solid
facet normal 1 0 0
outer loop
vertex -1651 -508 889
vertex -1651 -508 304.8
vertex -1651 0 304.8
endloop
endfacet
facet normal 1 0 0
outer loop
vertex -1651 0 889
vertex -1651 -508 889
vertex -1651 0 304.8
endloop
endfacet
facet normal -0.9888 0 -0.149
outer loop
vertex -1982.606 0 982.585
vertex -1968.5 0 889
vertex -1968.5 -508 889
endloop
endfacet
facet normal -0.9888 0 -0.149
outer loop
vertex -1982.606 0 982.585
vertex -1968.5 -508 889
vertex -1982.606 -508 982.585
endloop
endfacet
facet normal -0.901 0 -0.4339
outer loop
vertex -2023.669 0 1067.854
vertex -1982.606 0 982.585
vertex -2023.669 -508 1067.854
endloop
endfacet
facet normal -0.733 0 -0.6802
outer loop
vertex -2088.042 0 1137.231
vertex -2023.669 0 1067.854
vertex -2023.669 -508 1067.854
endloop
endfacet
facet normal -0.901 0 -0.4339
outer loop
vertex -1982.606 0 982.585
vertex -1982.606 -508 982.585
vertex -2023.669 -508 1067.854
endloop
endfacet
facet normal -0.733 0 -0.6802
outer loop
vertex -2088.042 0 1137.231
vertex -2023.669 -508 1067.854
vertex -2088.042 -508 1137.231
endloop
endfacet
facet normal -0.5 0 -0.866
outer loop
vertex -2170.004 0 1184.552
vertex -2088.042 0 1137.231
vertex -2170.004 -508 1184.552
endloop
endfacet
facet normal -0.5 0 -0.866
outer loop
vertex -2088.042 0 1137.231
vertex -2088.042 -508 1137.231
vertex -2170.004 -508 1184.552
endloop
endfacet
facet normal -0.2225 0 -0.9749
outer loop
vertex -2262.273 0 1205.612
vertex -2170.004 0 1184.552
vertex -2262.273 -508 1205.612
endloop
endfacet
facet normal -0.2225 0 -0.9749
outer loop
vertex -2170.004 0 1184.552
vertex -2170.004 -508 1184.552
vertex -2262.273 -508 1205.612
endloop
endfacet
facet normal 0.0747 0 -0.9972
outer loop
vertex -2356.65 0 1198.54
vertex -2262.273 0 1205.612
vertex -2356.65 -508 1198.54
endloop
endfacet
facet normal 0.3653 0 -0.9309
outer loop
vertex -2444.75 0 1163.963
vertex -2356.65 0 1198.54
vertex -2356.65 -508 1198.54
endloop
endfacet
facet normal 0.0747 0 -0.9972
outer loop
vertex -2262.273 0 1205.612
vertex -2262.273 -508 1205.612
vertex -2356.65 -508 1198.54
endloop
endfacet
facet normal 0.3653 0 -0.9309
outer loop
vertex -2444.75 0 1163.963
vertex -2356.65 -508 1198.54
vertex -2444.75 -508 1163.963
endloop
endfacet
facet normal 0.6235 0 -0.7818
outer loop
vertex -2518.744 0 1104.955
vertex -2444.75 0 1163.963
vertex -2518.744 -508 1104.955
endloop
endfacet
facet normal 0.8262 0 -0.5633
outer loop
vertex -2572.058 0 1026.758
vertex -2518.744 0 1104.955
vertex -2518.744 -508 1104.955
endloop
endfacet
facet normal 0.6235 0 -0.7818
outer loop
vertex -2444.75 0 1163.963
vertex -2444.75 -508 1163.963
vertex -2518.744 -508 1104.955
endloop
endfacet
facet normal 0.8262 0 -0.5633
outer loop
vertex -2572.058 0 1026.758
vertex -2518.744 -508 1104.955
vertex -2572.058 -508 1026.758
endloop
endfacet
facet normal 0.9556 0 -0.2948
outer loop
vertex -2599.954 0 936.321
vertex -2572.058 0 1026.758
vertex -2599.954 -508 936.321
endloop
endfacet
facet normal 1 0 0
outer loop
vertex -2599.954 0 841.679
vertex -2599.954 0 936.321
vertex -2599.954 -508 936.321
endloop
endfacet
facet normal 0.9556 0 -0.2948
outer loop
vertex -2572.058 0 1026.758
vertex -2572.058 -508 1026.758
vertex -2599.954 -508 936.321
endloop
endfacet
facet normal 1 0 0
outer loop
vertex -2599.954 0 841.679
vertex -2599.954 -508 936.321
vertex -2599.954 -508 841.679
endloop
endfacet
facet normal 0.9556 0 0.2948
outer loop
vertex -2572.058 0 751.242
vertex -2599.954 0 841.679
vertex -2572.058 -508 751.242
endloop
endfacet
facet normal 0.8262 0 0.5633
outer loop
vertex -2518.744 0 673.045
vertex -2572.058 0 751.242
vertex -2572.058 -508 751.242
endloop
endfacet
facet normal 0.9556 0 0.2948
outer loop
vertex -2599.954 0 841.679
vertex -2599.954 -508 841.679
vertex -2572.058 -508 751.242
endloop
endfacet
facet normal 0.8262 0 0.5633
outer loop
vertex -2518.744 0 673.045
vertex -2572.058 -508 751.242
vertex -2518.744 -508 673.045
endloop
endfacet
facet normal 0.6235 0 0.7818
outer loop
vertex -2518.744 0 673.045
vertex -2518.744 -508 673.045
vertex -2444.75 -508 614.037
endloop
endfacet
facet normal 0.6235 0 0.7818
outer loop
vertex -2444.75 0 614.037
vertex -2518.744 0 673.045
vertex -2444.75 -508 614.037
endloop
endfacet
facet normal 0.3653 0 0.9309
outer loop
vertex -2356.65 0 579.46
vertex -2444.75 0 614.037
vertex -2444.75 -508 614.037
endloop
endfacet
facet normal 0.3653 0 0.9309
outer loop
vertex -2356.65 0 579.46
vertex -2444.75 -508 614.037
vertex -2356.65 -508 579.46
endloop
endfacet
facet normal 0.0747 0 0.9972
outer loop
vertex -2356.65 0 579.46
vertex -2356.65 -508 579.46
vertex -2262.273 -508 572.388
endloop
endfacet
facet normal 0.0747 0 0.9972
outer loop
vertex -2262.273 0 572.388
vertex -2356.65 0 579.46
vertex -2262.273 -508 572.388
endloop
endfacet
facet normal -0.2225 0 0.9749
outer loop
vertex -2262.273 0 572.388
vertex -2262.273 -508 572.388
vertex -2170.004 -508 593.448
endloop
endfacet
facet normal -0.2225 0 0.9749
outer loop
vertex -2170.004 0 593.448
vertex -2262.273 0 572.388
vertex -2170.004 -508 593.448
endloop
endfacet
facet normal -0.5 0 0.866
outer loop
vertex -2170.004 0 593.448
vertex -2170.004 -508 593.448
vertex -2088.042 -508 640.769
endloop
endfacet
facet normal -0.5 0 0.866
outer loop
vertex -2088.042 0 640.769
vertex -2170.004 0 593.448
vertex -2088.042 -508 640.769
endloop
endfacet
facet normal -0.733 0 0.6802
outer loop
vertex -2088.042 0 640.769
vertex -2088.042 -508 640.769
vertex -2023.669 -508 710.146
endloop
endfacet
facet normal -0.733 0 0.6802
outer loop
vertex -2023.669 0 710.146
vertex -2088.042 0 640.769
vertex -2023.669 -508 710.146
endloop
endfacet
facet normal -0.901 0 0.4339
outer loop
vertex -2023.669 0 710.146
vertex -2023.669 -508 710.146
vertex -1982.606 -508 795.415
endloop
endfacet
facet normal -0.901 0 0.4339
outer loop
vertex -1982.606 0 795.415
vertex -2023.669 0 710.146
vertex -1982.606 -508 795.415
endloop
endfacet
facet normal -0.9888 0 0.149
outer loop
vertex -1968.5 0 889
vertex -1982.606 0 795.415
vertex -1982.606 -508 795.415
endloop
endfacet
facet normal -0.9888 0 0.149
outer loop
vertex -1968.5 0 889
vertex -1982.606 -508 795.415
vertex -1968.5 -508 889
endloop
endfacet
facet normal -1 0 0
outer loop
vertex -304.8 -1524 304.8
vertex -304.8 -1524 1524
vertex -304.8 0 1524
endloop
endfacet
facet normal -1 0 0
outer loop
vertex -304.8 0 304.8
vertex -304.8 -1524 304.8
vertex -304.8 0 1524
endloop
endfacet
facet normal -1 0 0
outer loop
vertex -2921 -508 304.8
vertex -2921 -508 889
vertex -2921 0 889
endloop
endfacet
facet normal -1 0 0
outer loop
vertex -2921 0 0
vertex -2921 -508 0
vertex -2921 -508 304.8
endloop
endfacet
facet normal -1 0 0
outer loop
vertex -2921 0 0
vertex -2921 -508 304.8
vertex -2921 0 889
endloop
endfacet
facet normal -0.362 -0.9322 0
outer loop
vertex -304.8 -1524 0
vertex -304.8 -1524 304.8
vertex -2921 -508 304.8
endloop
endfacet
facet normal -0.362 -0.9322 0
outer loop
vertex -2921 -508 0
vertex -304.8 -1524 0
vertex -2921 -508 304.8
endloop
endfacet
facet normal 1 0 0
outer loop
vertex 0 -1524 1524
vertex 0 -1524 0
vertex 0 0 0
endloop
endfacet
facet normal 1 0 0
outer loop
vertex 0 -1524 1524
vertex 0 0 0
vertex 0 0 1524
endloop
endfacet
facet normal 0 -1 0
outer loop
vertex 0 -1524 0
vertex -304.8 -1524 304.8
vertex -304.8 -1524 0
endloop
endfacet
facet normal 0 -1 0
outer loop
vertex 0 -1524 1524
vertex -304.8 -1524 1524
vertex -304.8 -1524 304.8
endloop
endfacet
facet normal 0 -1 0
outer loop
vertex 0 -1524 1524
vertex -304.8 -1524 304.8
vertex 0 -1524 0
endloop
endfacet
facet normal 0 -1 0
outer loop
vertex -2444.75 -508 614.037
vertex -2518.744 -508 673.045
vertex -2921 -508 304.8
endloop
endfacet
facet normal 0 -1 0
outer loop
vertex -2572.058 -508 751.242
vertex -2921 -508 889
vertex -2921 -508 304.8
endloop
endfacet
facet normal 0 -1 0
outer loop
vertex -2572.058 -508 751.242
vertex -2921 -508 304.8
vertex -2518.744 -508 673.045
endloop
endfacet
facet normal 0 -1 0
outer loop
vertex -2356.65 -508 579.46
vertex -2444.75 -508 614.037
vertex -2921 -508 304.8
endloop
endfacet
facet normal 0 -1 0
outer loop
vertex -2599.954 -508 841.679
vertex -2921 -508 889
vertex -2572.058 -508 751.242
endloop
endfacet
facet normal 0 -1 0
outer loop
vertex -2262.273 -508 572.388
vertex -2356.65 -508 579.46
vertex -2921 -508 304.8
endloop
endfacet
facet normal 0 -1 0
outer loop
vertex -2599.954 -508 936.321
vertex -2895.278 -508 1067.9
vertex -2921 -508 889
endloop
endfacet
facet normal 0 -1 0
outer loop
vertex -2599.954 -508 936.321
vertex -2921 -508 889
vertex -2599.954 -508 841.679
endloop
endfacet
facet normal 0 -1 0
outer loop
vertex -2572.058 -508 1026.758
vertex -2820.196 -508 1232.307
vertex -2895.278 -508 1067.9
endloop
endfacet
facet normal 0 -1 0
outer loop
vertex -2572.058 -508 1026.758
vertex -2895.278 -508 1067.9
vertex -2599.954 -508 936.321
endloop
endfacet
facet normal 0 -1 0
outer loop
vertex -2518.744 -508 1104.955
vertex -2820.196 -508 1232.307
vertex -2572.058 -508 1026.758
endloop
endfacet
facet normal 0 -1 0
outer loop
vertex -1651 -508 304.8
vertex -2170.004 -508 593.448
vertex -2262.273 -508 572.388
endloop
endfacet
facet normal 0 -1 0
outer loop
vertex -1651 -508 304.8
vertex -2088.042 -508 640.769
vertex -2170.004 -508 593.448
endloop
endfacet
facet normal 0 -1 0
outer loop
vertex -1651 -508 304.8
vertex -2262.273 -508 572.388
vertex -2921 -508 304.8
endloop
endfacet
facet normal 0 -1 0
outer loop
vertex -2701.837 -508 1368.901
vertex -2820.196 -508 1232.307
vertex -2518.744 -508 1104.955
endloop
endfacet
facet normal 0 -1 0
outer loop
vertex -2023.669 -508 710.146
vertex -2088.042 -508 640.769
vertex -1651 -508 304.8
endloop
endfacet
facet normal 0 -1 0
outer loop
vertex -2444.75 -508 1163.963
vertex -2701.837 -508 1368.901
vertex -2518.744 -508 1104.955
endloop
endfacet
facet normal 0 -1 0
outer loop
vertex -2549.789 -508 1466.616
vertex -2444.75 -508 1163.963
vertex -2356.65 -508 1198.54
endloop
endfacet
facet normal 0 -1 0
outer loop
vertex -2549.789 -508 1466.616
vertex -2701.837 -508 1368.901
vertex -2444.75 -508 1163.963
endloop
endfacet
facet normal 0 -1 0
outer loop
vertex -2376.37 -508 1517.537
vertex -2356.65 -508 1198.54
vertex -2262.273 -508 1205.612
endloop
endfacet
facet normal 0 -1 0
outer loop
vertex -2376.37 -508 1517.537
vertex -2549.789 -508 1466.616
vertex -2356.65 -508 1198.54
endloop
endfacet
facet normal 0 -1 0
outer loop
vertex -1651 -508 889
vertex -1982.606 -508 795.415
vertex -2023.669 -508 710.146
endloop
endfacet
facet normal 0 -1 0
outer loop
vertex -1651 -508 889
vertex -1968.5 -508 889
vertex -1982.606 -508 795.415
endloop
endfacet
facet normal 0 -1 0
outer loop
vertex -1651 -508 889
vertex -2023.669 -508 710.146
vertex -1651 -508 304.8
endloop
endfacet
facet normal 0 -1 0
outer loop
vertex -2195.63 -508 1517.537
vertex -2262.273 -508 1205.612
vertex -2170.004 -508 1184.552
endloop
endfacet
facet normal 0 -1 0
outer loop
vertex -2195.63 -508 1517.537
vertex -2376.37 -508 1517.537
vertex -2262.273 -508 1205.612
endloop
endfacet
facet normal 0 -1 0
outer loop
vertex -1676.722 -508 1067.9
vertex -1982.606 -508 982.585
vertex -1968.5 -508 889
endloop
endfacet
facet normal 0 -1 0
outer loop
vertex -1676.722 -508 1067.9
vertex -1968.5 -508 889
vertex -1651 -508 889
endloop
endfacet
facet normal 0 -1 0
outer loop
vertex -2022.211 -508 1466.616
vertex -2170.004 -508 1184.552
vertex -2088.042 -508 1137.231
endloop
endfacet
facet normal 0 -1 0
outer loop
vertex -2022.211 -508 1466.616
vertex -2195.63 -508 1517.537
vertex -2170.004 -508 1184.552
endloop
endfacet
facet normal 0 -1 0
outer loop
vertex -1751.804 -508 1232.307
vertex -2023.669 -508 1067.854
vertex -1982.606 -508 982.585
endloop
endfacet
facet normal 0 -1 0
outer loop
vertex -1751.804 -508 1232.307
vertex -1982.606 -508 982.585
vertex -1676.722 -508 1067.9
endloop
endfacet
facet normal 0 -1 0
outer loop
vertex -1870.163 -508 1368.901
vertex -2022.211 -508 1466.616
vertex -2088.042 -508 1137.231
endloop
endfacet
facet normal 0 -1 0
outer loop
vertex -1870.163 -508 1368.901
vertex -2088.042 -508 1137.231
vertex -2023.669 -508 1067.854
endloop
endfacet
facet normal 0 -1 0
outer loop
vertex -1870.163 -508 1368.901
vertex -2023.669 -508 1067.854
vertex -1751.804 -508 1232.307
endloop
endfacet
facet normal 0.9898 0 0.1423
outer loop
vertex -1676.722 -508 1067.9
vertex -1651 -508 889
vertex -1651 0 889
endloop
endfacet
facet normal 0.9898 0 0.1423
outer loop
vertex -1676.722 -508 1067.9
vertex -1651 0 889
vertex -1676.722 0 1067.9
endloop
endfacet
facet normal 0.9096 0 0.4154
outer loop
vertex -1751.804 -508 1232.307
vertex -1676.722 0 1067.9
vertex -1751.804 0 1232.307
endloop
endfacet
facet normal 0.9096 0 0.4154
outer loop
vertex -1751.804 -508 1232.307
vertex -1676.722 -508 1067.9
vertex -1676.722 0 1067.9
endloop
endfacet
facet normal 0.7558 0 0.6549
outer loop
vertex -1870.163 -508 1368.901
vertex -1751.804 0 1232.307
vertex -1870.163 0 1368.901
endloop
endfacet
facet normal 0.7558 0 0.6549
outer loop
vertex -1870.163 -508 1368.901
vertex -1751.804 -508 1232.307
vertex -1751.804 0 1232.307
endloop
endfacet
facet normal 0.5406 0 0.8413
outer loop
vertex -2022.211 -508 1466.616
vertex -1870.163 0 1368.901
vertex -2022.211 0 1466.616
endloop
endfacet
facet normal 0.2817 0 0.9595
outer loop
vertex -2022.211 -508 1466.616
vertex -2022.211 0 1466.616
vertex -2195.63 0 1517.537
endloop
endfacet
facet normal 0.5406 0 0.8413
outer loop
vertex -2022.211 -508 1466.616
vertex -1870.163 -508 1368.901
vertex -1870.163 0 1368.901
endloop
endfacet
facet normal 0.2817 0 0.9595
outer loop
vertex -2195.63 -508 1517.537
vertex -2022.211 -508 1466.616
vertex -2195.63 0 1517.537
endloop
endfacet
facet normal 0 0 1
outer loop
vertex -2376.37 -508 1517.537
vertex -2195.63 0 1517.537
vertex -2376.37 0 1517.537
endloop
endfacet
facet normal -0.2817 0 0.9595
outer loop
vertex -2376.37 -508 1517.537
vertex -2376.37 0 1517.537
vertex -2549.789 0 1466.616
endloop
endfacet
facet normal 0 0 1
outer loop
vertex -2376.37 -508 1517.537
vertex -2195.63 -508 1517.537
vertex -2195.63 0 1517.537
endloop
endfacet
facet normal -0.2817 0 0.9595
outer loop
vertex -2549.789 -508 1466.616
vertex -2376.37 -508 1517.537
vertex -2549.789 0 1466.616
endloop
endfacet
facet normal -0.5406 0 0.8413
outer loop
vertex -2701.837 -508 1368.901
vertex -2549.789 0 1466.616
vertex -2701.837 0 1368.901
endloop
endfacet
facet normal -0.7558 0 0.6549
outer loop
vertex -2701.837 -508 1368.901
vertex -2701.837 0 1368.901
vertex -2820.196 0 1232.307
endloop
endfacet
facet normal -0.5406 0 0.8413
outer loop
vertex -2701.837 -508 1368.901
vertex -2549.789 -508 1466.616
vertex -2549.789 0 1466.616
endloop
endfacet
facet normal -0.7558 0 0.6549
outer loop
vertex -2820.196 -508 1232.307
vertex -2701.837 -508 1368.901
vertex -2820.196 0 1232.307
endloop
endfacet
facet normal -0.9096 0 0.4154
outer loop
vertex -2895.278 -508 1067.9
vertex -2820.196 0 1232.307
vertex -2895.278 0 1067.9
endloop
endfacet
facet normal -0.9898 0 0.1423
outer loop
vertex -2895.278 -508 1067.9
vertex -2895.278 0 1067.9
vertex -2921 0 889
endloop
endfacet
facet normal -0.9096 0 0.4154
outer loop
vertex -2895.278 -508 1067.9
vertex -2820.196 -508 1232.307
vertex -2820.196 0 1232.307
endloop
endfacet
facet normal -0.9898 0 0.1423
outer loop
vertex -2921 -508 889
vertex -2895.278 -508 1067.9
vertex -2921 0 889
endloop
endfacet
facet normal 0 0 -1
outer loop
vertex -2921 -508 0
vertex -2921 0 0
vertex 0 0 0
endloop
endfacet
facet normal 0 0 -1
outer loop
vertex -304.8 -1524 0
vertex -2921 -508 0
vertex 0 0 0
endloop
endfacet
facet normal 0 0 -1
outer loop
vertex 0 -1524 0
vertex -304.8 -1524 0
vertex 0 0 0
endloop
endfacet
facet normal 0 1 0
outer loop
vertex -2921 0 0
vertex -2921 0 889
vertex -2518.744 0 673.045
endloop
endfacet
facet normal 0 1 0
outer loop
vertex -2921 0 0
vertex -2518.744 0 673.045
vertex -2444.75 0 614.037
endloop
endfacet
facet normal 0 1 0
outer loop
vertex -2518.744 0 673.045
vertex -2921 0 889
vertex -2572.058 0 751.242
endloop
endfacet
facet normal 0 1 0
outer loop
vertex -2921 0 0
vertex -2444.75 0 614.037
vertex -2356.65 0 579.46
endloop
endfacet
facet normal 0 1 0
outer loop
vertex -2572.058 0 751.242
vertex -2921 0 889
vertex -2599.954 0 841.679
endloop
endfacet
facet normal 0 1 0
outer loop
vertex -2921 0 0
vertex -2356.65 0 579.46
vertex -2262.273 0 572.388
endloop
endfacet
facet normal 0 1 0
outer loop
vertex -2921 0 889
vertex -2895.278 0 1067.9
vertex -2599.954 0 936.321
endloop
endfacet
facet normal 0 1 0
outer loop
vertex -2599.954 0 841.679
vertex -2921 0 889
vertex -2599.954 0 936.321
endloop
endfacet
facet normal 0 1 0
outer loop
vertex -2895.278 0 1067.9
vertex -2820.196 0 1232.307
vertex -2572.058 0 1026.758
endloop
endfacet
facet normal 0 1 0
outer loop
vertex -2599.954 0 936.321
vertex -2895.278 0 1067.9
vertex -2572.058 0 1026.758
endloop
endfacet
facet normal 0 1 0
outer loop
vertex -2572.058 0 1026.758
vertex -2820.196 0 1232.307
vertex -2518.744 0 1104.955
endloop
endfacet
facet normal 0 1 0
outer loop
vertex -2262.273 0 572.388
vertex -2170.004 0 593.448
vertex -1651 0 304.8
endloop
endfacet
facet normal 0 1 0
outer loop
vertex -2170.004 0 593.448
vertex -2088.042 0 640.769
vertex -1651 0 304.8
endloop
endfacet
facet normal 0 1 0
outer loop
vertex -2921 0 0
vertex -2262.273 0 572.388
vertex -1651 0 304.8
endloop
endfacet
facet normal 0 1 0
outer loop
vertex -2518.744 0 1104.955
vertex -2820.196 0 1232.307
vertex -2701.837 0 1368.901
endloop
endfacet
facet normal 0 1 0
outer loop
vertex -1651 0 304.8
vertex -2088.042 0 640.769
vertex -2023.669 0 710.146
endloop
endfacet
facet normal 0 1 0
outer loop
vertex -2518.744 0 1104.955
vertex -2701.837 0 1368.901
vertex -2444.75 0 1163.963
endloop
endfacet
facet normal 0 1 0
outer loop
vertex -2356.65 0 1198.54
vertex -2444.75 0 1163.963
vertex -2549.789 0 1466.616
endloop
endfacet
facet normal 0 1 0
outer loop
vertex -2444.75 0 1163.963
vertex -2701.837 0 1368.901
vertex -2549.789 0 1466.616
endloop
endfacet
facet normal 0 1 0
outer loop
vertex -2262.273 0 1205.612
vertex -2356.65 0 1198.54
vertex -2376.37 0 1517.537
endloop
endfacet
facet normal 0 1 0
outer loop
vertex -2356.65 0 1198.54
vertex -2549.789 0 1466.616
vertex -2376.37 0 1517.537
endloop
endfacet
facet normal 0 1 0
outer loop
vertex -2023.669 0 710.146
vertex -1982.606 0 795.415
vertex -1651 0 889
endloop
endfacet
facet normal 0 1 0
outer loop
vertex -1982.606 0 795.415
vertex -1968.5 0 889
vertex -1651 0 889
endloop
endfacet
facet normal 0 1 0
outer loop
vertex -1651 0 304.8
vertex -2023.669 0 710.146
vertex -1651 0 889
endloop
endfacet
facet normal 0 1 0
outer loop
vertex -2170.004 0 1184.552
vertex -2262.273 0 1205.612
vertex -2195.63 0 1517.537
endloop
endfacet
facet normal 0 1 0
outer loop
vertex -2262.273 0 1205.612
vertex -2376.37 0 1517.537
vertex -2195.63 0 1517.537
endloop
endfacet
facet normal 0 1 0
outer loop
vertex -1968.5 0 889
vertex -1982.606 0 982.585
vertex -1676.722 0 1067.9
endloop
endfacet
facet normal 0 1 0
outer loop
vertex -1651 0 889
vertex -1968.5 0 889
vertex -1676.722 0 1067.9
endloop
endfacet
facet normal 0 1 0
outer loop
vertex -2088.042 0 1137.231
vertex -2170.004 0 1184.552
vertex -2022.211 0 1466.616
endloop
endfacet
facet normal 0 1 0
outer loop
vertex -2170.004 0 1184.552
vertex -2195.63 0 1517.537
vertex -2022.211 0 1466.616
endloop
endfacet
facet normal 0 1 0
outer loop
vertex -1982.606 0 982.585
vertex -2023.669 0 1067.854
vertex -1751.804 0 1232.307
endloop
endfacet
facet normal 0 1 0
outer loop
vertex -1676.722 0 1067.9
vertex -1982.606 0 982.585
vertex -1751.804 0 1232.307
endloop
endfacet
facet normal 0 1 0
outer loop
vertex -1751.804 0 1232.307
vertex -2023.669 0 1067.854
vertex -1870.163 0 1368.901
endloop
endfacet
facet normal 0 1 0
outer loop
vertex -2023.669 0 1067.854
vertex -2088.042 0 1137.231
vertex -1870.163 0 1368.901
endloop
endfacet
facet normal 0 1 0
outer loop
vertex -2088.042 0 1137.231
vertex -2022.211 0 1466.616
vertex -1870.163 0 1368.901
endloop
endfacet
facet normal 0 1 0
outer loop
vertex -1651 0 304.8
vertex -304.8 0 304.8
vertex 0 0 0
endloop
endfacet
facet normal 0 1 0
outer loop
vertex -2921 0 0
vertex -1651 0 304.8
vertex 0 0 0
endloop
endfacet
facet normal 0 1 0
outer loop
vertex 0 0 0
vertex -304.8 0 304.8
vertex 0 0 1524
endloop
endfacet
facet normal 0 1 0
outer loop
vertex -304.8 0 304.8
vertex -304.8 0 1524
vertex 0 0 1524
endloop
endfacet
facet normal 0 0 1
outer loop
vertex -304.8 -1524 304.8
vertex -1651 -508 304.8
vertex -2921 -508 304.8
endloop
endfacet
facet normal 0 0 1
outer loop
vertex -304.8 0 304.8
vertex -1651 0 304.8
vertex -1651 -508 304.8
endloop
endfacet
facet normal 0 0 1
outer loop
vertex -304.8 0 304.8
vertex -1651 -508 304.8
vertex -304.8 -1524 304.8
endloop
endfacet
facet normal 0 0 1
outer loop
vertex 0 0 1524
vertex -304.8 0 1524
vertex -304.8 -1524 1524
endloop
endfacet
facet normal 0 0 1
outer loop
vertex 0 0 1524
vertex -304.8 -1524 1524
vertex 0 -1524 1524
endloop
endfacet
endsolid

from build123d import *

# Parameters (mm, degrees)
F0_W      = 2921
F0_H      = 1524
F1_DEPTH  = 1524
F2_W      = 2616.2
F2_H      = 1219.2
F3_DEPTH  = 1016
F4_W      = 1346.2
F4_H      = 508
F5_DEPTH  = 1219.2
F7_DEPTH  = 1270
F8_DEPTH  = 1219.2
F9_W      = 1270
F9_H      = 508
F10_DEPTH = 584.2
F12_DEPTH = 508
F13_R     = 317.5
F14_DEPTH = 1270


with BuildPart() as f1:
    # F0 (on Front) → F1 (new body)
    with BuildSketch(Plane.XZ):
        with Locations((-1460.5, 762)):
            Rectangle(F0_W, F0_H)
    extrude(amount=F1_DEPTH)

    # F2 (on face) → F3 (cut)
    with BuildSketch(Plane.XZ.offset(1524)):
        with Locations((-1612.9, 914.4)):
            Rectangle(F2_W, F2_H)
    extrude(amount=-F3_DEPTH, mode=Mode.SUBTRACT)

    # F4 (on face) → F5 (cut)
    with BuildSketch(Plane.XY.offset(1524)):
        with Locations((-977.9, -254)):
            Rectangle(F4_W, F4_H)
    extrude(amount=-F5_DEPTH, mode=Mode.SUBTRACT)

    # F6 (on face) → F7 (cut)
    with BuildSketch(Plane.XY.offset(304.8)):
        Polygon((-304.8, -1524), (-2921, -508), (-2921, -1524), align=None)
    extrude(amount=-F7_DEPTH, mode=Mode.SUBTRACT)

    # F8 (cut): a face of the model
    f8_faces = [f1.faces().sort_by_distance(p)[0] for p in [
        (-2286, -254, 1524),
    ]]
    extrude(f8_faces, amount=-F8_DEPTH, mode=Mode.SUBTRACT)

    # F9 (on face) → F10 (join)
    with BuildSketch(Plane.XY.offset(304.8)):
        with Locations((-2286, -254)):
            Rectangle(F9_W, F9_H)
    extrude(amount=F10_DEPTH)

    # F11 (on face) → F12 (join)
    with BuildSketch(Plane.XZ.offset(508)):
        with BuildLine():
            Line((-2921, 889), (-1651, 889))
            ThreePointArc((-1651, 889), (-2286, 1524), (-2921, 889))
        make_face()
    extrude(amount=-F12_DEPTH)

    # F13 (on face) → F14 (cut)
    with BuildSketch(Plane.XZ.offset(508)):
        with Locations((-2286, 889)):
            Circle(F13_R)
    extrude(amount=-F14_DEPTH, mode=Mode.SUBTRACT)


solid = f1.part
